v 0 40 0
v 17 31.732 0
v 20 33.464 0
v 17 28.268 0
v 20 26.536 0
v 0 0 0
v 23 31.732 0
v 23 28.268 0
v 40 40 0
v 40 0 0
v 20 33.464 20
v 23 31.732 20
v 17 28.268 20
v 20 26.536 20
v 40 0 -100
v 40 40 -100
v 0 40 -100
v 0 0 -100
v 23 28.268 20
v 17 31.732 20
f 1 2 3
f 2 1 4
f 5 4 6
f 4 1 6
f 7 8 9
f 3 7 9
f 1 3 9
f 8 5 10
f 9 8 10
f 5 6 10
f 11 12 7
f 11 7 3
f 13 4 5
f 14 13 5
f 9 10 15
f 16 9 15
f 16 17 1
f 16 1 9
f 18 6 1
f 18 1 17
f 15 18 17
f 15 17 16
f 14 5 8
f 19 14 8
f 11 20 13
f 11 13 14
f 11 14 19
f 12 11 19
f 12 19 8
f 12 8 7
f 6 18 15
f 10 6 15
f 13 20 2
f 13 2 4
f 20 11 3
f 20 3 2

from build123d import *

# Parameters (mm, degrees)
ESQUISSE1_W        = 40
ESQUISSE1_H        = 100
BOSS_EXTRU_1_DEPTH = 40
BOSS_EXTRU_2_DEPTH = 20


with BuildPart() as part:
    # Esquisse1 → Boss.-Extru.1 (new body)
    with BuildSketch(Plane(origin=(0, 0, 0), x_dir=(1, 0, 0), z_dir=(0, 1, 0))):
        with Locations((20, 50)):
            Rectangle(ESQUISSE1_W, ESQUISSE1_H)
    extrude(amount=BOSS_EXTRU_1_DEPTH)

    # Esquisse2 → Boss.-Extru.2 (add)
    with BuildSketch(Plane.XY):
        Polygon((23, 28.267949192), (23, 31.732050808), (20, 33.464101615), (17, 31.732050808), (17, 28.267949192), (20, 26.535898385), align=None)
    extrude(amount=BOSS_EXTRU_2_DEPTH)


solid = part.part
